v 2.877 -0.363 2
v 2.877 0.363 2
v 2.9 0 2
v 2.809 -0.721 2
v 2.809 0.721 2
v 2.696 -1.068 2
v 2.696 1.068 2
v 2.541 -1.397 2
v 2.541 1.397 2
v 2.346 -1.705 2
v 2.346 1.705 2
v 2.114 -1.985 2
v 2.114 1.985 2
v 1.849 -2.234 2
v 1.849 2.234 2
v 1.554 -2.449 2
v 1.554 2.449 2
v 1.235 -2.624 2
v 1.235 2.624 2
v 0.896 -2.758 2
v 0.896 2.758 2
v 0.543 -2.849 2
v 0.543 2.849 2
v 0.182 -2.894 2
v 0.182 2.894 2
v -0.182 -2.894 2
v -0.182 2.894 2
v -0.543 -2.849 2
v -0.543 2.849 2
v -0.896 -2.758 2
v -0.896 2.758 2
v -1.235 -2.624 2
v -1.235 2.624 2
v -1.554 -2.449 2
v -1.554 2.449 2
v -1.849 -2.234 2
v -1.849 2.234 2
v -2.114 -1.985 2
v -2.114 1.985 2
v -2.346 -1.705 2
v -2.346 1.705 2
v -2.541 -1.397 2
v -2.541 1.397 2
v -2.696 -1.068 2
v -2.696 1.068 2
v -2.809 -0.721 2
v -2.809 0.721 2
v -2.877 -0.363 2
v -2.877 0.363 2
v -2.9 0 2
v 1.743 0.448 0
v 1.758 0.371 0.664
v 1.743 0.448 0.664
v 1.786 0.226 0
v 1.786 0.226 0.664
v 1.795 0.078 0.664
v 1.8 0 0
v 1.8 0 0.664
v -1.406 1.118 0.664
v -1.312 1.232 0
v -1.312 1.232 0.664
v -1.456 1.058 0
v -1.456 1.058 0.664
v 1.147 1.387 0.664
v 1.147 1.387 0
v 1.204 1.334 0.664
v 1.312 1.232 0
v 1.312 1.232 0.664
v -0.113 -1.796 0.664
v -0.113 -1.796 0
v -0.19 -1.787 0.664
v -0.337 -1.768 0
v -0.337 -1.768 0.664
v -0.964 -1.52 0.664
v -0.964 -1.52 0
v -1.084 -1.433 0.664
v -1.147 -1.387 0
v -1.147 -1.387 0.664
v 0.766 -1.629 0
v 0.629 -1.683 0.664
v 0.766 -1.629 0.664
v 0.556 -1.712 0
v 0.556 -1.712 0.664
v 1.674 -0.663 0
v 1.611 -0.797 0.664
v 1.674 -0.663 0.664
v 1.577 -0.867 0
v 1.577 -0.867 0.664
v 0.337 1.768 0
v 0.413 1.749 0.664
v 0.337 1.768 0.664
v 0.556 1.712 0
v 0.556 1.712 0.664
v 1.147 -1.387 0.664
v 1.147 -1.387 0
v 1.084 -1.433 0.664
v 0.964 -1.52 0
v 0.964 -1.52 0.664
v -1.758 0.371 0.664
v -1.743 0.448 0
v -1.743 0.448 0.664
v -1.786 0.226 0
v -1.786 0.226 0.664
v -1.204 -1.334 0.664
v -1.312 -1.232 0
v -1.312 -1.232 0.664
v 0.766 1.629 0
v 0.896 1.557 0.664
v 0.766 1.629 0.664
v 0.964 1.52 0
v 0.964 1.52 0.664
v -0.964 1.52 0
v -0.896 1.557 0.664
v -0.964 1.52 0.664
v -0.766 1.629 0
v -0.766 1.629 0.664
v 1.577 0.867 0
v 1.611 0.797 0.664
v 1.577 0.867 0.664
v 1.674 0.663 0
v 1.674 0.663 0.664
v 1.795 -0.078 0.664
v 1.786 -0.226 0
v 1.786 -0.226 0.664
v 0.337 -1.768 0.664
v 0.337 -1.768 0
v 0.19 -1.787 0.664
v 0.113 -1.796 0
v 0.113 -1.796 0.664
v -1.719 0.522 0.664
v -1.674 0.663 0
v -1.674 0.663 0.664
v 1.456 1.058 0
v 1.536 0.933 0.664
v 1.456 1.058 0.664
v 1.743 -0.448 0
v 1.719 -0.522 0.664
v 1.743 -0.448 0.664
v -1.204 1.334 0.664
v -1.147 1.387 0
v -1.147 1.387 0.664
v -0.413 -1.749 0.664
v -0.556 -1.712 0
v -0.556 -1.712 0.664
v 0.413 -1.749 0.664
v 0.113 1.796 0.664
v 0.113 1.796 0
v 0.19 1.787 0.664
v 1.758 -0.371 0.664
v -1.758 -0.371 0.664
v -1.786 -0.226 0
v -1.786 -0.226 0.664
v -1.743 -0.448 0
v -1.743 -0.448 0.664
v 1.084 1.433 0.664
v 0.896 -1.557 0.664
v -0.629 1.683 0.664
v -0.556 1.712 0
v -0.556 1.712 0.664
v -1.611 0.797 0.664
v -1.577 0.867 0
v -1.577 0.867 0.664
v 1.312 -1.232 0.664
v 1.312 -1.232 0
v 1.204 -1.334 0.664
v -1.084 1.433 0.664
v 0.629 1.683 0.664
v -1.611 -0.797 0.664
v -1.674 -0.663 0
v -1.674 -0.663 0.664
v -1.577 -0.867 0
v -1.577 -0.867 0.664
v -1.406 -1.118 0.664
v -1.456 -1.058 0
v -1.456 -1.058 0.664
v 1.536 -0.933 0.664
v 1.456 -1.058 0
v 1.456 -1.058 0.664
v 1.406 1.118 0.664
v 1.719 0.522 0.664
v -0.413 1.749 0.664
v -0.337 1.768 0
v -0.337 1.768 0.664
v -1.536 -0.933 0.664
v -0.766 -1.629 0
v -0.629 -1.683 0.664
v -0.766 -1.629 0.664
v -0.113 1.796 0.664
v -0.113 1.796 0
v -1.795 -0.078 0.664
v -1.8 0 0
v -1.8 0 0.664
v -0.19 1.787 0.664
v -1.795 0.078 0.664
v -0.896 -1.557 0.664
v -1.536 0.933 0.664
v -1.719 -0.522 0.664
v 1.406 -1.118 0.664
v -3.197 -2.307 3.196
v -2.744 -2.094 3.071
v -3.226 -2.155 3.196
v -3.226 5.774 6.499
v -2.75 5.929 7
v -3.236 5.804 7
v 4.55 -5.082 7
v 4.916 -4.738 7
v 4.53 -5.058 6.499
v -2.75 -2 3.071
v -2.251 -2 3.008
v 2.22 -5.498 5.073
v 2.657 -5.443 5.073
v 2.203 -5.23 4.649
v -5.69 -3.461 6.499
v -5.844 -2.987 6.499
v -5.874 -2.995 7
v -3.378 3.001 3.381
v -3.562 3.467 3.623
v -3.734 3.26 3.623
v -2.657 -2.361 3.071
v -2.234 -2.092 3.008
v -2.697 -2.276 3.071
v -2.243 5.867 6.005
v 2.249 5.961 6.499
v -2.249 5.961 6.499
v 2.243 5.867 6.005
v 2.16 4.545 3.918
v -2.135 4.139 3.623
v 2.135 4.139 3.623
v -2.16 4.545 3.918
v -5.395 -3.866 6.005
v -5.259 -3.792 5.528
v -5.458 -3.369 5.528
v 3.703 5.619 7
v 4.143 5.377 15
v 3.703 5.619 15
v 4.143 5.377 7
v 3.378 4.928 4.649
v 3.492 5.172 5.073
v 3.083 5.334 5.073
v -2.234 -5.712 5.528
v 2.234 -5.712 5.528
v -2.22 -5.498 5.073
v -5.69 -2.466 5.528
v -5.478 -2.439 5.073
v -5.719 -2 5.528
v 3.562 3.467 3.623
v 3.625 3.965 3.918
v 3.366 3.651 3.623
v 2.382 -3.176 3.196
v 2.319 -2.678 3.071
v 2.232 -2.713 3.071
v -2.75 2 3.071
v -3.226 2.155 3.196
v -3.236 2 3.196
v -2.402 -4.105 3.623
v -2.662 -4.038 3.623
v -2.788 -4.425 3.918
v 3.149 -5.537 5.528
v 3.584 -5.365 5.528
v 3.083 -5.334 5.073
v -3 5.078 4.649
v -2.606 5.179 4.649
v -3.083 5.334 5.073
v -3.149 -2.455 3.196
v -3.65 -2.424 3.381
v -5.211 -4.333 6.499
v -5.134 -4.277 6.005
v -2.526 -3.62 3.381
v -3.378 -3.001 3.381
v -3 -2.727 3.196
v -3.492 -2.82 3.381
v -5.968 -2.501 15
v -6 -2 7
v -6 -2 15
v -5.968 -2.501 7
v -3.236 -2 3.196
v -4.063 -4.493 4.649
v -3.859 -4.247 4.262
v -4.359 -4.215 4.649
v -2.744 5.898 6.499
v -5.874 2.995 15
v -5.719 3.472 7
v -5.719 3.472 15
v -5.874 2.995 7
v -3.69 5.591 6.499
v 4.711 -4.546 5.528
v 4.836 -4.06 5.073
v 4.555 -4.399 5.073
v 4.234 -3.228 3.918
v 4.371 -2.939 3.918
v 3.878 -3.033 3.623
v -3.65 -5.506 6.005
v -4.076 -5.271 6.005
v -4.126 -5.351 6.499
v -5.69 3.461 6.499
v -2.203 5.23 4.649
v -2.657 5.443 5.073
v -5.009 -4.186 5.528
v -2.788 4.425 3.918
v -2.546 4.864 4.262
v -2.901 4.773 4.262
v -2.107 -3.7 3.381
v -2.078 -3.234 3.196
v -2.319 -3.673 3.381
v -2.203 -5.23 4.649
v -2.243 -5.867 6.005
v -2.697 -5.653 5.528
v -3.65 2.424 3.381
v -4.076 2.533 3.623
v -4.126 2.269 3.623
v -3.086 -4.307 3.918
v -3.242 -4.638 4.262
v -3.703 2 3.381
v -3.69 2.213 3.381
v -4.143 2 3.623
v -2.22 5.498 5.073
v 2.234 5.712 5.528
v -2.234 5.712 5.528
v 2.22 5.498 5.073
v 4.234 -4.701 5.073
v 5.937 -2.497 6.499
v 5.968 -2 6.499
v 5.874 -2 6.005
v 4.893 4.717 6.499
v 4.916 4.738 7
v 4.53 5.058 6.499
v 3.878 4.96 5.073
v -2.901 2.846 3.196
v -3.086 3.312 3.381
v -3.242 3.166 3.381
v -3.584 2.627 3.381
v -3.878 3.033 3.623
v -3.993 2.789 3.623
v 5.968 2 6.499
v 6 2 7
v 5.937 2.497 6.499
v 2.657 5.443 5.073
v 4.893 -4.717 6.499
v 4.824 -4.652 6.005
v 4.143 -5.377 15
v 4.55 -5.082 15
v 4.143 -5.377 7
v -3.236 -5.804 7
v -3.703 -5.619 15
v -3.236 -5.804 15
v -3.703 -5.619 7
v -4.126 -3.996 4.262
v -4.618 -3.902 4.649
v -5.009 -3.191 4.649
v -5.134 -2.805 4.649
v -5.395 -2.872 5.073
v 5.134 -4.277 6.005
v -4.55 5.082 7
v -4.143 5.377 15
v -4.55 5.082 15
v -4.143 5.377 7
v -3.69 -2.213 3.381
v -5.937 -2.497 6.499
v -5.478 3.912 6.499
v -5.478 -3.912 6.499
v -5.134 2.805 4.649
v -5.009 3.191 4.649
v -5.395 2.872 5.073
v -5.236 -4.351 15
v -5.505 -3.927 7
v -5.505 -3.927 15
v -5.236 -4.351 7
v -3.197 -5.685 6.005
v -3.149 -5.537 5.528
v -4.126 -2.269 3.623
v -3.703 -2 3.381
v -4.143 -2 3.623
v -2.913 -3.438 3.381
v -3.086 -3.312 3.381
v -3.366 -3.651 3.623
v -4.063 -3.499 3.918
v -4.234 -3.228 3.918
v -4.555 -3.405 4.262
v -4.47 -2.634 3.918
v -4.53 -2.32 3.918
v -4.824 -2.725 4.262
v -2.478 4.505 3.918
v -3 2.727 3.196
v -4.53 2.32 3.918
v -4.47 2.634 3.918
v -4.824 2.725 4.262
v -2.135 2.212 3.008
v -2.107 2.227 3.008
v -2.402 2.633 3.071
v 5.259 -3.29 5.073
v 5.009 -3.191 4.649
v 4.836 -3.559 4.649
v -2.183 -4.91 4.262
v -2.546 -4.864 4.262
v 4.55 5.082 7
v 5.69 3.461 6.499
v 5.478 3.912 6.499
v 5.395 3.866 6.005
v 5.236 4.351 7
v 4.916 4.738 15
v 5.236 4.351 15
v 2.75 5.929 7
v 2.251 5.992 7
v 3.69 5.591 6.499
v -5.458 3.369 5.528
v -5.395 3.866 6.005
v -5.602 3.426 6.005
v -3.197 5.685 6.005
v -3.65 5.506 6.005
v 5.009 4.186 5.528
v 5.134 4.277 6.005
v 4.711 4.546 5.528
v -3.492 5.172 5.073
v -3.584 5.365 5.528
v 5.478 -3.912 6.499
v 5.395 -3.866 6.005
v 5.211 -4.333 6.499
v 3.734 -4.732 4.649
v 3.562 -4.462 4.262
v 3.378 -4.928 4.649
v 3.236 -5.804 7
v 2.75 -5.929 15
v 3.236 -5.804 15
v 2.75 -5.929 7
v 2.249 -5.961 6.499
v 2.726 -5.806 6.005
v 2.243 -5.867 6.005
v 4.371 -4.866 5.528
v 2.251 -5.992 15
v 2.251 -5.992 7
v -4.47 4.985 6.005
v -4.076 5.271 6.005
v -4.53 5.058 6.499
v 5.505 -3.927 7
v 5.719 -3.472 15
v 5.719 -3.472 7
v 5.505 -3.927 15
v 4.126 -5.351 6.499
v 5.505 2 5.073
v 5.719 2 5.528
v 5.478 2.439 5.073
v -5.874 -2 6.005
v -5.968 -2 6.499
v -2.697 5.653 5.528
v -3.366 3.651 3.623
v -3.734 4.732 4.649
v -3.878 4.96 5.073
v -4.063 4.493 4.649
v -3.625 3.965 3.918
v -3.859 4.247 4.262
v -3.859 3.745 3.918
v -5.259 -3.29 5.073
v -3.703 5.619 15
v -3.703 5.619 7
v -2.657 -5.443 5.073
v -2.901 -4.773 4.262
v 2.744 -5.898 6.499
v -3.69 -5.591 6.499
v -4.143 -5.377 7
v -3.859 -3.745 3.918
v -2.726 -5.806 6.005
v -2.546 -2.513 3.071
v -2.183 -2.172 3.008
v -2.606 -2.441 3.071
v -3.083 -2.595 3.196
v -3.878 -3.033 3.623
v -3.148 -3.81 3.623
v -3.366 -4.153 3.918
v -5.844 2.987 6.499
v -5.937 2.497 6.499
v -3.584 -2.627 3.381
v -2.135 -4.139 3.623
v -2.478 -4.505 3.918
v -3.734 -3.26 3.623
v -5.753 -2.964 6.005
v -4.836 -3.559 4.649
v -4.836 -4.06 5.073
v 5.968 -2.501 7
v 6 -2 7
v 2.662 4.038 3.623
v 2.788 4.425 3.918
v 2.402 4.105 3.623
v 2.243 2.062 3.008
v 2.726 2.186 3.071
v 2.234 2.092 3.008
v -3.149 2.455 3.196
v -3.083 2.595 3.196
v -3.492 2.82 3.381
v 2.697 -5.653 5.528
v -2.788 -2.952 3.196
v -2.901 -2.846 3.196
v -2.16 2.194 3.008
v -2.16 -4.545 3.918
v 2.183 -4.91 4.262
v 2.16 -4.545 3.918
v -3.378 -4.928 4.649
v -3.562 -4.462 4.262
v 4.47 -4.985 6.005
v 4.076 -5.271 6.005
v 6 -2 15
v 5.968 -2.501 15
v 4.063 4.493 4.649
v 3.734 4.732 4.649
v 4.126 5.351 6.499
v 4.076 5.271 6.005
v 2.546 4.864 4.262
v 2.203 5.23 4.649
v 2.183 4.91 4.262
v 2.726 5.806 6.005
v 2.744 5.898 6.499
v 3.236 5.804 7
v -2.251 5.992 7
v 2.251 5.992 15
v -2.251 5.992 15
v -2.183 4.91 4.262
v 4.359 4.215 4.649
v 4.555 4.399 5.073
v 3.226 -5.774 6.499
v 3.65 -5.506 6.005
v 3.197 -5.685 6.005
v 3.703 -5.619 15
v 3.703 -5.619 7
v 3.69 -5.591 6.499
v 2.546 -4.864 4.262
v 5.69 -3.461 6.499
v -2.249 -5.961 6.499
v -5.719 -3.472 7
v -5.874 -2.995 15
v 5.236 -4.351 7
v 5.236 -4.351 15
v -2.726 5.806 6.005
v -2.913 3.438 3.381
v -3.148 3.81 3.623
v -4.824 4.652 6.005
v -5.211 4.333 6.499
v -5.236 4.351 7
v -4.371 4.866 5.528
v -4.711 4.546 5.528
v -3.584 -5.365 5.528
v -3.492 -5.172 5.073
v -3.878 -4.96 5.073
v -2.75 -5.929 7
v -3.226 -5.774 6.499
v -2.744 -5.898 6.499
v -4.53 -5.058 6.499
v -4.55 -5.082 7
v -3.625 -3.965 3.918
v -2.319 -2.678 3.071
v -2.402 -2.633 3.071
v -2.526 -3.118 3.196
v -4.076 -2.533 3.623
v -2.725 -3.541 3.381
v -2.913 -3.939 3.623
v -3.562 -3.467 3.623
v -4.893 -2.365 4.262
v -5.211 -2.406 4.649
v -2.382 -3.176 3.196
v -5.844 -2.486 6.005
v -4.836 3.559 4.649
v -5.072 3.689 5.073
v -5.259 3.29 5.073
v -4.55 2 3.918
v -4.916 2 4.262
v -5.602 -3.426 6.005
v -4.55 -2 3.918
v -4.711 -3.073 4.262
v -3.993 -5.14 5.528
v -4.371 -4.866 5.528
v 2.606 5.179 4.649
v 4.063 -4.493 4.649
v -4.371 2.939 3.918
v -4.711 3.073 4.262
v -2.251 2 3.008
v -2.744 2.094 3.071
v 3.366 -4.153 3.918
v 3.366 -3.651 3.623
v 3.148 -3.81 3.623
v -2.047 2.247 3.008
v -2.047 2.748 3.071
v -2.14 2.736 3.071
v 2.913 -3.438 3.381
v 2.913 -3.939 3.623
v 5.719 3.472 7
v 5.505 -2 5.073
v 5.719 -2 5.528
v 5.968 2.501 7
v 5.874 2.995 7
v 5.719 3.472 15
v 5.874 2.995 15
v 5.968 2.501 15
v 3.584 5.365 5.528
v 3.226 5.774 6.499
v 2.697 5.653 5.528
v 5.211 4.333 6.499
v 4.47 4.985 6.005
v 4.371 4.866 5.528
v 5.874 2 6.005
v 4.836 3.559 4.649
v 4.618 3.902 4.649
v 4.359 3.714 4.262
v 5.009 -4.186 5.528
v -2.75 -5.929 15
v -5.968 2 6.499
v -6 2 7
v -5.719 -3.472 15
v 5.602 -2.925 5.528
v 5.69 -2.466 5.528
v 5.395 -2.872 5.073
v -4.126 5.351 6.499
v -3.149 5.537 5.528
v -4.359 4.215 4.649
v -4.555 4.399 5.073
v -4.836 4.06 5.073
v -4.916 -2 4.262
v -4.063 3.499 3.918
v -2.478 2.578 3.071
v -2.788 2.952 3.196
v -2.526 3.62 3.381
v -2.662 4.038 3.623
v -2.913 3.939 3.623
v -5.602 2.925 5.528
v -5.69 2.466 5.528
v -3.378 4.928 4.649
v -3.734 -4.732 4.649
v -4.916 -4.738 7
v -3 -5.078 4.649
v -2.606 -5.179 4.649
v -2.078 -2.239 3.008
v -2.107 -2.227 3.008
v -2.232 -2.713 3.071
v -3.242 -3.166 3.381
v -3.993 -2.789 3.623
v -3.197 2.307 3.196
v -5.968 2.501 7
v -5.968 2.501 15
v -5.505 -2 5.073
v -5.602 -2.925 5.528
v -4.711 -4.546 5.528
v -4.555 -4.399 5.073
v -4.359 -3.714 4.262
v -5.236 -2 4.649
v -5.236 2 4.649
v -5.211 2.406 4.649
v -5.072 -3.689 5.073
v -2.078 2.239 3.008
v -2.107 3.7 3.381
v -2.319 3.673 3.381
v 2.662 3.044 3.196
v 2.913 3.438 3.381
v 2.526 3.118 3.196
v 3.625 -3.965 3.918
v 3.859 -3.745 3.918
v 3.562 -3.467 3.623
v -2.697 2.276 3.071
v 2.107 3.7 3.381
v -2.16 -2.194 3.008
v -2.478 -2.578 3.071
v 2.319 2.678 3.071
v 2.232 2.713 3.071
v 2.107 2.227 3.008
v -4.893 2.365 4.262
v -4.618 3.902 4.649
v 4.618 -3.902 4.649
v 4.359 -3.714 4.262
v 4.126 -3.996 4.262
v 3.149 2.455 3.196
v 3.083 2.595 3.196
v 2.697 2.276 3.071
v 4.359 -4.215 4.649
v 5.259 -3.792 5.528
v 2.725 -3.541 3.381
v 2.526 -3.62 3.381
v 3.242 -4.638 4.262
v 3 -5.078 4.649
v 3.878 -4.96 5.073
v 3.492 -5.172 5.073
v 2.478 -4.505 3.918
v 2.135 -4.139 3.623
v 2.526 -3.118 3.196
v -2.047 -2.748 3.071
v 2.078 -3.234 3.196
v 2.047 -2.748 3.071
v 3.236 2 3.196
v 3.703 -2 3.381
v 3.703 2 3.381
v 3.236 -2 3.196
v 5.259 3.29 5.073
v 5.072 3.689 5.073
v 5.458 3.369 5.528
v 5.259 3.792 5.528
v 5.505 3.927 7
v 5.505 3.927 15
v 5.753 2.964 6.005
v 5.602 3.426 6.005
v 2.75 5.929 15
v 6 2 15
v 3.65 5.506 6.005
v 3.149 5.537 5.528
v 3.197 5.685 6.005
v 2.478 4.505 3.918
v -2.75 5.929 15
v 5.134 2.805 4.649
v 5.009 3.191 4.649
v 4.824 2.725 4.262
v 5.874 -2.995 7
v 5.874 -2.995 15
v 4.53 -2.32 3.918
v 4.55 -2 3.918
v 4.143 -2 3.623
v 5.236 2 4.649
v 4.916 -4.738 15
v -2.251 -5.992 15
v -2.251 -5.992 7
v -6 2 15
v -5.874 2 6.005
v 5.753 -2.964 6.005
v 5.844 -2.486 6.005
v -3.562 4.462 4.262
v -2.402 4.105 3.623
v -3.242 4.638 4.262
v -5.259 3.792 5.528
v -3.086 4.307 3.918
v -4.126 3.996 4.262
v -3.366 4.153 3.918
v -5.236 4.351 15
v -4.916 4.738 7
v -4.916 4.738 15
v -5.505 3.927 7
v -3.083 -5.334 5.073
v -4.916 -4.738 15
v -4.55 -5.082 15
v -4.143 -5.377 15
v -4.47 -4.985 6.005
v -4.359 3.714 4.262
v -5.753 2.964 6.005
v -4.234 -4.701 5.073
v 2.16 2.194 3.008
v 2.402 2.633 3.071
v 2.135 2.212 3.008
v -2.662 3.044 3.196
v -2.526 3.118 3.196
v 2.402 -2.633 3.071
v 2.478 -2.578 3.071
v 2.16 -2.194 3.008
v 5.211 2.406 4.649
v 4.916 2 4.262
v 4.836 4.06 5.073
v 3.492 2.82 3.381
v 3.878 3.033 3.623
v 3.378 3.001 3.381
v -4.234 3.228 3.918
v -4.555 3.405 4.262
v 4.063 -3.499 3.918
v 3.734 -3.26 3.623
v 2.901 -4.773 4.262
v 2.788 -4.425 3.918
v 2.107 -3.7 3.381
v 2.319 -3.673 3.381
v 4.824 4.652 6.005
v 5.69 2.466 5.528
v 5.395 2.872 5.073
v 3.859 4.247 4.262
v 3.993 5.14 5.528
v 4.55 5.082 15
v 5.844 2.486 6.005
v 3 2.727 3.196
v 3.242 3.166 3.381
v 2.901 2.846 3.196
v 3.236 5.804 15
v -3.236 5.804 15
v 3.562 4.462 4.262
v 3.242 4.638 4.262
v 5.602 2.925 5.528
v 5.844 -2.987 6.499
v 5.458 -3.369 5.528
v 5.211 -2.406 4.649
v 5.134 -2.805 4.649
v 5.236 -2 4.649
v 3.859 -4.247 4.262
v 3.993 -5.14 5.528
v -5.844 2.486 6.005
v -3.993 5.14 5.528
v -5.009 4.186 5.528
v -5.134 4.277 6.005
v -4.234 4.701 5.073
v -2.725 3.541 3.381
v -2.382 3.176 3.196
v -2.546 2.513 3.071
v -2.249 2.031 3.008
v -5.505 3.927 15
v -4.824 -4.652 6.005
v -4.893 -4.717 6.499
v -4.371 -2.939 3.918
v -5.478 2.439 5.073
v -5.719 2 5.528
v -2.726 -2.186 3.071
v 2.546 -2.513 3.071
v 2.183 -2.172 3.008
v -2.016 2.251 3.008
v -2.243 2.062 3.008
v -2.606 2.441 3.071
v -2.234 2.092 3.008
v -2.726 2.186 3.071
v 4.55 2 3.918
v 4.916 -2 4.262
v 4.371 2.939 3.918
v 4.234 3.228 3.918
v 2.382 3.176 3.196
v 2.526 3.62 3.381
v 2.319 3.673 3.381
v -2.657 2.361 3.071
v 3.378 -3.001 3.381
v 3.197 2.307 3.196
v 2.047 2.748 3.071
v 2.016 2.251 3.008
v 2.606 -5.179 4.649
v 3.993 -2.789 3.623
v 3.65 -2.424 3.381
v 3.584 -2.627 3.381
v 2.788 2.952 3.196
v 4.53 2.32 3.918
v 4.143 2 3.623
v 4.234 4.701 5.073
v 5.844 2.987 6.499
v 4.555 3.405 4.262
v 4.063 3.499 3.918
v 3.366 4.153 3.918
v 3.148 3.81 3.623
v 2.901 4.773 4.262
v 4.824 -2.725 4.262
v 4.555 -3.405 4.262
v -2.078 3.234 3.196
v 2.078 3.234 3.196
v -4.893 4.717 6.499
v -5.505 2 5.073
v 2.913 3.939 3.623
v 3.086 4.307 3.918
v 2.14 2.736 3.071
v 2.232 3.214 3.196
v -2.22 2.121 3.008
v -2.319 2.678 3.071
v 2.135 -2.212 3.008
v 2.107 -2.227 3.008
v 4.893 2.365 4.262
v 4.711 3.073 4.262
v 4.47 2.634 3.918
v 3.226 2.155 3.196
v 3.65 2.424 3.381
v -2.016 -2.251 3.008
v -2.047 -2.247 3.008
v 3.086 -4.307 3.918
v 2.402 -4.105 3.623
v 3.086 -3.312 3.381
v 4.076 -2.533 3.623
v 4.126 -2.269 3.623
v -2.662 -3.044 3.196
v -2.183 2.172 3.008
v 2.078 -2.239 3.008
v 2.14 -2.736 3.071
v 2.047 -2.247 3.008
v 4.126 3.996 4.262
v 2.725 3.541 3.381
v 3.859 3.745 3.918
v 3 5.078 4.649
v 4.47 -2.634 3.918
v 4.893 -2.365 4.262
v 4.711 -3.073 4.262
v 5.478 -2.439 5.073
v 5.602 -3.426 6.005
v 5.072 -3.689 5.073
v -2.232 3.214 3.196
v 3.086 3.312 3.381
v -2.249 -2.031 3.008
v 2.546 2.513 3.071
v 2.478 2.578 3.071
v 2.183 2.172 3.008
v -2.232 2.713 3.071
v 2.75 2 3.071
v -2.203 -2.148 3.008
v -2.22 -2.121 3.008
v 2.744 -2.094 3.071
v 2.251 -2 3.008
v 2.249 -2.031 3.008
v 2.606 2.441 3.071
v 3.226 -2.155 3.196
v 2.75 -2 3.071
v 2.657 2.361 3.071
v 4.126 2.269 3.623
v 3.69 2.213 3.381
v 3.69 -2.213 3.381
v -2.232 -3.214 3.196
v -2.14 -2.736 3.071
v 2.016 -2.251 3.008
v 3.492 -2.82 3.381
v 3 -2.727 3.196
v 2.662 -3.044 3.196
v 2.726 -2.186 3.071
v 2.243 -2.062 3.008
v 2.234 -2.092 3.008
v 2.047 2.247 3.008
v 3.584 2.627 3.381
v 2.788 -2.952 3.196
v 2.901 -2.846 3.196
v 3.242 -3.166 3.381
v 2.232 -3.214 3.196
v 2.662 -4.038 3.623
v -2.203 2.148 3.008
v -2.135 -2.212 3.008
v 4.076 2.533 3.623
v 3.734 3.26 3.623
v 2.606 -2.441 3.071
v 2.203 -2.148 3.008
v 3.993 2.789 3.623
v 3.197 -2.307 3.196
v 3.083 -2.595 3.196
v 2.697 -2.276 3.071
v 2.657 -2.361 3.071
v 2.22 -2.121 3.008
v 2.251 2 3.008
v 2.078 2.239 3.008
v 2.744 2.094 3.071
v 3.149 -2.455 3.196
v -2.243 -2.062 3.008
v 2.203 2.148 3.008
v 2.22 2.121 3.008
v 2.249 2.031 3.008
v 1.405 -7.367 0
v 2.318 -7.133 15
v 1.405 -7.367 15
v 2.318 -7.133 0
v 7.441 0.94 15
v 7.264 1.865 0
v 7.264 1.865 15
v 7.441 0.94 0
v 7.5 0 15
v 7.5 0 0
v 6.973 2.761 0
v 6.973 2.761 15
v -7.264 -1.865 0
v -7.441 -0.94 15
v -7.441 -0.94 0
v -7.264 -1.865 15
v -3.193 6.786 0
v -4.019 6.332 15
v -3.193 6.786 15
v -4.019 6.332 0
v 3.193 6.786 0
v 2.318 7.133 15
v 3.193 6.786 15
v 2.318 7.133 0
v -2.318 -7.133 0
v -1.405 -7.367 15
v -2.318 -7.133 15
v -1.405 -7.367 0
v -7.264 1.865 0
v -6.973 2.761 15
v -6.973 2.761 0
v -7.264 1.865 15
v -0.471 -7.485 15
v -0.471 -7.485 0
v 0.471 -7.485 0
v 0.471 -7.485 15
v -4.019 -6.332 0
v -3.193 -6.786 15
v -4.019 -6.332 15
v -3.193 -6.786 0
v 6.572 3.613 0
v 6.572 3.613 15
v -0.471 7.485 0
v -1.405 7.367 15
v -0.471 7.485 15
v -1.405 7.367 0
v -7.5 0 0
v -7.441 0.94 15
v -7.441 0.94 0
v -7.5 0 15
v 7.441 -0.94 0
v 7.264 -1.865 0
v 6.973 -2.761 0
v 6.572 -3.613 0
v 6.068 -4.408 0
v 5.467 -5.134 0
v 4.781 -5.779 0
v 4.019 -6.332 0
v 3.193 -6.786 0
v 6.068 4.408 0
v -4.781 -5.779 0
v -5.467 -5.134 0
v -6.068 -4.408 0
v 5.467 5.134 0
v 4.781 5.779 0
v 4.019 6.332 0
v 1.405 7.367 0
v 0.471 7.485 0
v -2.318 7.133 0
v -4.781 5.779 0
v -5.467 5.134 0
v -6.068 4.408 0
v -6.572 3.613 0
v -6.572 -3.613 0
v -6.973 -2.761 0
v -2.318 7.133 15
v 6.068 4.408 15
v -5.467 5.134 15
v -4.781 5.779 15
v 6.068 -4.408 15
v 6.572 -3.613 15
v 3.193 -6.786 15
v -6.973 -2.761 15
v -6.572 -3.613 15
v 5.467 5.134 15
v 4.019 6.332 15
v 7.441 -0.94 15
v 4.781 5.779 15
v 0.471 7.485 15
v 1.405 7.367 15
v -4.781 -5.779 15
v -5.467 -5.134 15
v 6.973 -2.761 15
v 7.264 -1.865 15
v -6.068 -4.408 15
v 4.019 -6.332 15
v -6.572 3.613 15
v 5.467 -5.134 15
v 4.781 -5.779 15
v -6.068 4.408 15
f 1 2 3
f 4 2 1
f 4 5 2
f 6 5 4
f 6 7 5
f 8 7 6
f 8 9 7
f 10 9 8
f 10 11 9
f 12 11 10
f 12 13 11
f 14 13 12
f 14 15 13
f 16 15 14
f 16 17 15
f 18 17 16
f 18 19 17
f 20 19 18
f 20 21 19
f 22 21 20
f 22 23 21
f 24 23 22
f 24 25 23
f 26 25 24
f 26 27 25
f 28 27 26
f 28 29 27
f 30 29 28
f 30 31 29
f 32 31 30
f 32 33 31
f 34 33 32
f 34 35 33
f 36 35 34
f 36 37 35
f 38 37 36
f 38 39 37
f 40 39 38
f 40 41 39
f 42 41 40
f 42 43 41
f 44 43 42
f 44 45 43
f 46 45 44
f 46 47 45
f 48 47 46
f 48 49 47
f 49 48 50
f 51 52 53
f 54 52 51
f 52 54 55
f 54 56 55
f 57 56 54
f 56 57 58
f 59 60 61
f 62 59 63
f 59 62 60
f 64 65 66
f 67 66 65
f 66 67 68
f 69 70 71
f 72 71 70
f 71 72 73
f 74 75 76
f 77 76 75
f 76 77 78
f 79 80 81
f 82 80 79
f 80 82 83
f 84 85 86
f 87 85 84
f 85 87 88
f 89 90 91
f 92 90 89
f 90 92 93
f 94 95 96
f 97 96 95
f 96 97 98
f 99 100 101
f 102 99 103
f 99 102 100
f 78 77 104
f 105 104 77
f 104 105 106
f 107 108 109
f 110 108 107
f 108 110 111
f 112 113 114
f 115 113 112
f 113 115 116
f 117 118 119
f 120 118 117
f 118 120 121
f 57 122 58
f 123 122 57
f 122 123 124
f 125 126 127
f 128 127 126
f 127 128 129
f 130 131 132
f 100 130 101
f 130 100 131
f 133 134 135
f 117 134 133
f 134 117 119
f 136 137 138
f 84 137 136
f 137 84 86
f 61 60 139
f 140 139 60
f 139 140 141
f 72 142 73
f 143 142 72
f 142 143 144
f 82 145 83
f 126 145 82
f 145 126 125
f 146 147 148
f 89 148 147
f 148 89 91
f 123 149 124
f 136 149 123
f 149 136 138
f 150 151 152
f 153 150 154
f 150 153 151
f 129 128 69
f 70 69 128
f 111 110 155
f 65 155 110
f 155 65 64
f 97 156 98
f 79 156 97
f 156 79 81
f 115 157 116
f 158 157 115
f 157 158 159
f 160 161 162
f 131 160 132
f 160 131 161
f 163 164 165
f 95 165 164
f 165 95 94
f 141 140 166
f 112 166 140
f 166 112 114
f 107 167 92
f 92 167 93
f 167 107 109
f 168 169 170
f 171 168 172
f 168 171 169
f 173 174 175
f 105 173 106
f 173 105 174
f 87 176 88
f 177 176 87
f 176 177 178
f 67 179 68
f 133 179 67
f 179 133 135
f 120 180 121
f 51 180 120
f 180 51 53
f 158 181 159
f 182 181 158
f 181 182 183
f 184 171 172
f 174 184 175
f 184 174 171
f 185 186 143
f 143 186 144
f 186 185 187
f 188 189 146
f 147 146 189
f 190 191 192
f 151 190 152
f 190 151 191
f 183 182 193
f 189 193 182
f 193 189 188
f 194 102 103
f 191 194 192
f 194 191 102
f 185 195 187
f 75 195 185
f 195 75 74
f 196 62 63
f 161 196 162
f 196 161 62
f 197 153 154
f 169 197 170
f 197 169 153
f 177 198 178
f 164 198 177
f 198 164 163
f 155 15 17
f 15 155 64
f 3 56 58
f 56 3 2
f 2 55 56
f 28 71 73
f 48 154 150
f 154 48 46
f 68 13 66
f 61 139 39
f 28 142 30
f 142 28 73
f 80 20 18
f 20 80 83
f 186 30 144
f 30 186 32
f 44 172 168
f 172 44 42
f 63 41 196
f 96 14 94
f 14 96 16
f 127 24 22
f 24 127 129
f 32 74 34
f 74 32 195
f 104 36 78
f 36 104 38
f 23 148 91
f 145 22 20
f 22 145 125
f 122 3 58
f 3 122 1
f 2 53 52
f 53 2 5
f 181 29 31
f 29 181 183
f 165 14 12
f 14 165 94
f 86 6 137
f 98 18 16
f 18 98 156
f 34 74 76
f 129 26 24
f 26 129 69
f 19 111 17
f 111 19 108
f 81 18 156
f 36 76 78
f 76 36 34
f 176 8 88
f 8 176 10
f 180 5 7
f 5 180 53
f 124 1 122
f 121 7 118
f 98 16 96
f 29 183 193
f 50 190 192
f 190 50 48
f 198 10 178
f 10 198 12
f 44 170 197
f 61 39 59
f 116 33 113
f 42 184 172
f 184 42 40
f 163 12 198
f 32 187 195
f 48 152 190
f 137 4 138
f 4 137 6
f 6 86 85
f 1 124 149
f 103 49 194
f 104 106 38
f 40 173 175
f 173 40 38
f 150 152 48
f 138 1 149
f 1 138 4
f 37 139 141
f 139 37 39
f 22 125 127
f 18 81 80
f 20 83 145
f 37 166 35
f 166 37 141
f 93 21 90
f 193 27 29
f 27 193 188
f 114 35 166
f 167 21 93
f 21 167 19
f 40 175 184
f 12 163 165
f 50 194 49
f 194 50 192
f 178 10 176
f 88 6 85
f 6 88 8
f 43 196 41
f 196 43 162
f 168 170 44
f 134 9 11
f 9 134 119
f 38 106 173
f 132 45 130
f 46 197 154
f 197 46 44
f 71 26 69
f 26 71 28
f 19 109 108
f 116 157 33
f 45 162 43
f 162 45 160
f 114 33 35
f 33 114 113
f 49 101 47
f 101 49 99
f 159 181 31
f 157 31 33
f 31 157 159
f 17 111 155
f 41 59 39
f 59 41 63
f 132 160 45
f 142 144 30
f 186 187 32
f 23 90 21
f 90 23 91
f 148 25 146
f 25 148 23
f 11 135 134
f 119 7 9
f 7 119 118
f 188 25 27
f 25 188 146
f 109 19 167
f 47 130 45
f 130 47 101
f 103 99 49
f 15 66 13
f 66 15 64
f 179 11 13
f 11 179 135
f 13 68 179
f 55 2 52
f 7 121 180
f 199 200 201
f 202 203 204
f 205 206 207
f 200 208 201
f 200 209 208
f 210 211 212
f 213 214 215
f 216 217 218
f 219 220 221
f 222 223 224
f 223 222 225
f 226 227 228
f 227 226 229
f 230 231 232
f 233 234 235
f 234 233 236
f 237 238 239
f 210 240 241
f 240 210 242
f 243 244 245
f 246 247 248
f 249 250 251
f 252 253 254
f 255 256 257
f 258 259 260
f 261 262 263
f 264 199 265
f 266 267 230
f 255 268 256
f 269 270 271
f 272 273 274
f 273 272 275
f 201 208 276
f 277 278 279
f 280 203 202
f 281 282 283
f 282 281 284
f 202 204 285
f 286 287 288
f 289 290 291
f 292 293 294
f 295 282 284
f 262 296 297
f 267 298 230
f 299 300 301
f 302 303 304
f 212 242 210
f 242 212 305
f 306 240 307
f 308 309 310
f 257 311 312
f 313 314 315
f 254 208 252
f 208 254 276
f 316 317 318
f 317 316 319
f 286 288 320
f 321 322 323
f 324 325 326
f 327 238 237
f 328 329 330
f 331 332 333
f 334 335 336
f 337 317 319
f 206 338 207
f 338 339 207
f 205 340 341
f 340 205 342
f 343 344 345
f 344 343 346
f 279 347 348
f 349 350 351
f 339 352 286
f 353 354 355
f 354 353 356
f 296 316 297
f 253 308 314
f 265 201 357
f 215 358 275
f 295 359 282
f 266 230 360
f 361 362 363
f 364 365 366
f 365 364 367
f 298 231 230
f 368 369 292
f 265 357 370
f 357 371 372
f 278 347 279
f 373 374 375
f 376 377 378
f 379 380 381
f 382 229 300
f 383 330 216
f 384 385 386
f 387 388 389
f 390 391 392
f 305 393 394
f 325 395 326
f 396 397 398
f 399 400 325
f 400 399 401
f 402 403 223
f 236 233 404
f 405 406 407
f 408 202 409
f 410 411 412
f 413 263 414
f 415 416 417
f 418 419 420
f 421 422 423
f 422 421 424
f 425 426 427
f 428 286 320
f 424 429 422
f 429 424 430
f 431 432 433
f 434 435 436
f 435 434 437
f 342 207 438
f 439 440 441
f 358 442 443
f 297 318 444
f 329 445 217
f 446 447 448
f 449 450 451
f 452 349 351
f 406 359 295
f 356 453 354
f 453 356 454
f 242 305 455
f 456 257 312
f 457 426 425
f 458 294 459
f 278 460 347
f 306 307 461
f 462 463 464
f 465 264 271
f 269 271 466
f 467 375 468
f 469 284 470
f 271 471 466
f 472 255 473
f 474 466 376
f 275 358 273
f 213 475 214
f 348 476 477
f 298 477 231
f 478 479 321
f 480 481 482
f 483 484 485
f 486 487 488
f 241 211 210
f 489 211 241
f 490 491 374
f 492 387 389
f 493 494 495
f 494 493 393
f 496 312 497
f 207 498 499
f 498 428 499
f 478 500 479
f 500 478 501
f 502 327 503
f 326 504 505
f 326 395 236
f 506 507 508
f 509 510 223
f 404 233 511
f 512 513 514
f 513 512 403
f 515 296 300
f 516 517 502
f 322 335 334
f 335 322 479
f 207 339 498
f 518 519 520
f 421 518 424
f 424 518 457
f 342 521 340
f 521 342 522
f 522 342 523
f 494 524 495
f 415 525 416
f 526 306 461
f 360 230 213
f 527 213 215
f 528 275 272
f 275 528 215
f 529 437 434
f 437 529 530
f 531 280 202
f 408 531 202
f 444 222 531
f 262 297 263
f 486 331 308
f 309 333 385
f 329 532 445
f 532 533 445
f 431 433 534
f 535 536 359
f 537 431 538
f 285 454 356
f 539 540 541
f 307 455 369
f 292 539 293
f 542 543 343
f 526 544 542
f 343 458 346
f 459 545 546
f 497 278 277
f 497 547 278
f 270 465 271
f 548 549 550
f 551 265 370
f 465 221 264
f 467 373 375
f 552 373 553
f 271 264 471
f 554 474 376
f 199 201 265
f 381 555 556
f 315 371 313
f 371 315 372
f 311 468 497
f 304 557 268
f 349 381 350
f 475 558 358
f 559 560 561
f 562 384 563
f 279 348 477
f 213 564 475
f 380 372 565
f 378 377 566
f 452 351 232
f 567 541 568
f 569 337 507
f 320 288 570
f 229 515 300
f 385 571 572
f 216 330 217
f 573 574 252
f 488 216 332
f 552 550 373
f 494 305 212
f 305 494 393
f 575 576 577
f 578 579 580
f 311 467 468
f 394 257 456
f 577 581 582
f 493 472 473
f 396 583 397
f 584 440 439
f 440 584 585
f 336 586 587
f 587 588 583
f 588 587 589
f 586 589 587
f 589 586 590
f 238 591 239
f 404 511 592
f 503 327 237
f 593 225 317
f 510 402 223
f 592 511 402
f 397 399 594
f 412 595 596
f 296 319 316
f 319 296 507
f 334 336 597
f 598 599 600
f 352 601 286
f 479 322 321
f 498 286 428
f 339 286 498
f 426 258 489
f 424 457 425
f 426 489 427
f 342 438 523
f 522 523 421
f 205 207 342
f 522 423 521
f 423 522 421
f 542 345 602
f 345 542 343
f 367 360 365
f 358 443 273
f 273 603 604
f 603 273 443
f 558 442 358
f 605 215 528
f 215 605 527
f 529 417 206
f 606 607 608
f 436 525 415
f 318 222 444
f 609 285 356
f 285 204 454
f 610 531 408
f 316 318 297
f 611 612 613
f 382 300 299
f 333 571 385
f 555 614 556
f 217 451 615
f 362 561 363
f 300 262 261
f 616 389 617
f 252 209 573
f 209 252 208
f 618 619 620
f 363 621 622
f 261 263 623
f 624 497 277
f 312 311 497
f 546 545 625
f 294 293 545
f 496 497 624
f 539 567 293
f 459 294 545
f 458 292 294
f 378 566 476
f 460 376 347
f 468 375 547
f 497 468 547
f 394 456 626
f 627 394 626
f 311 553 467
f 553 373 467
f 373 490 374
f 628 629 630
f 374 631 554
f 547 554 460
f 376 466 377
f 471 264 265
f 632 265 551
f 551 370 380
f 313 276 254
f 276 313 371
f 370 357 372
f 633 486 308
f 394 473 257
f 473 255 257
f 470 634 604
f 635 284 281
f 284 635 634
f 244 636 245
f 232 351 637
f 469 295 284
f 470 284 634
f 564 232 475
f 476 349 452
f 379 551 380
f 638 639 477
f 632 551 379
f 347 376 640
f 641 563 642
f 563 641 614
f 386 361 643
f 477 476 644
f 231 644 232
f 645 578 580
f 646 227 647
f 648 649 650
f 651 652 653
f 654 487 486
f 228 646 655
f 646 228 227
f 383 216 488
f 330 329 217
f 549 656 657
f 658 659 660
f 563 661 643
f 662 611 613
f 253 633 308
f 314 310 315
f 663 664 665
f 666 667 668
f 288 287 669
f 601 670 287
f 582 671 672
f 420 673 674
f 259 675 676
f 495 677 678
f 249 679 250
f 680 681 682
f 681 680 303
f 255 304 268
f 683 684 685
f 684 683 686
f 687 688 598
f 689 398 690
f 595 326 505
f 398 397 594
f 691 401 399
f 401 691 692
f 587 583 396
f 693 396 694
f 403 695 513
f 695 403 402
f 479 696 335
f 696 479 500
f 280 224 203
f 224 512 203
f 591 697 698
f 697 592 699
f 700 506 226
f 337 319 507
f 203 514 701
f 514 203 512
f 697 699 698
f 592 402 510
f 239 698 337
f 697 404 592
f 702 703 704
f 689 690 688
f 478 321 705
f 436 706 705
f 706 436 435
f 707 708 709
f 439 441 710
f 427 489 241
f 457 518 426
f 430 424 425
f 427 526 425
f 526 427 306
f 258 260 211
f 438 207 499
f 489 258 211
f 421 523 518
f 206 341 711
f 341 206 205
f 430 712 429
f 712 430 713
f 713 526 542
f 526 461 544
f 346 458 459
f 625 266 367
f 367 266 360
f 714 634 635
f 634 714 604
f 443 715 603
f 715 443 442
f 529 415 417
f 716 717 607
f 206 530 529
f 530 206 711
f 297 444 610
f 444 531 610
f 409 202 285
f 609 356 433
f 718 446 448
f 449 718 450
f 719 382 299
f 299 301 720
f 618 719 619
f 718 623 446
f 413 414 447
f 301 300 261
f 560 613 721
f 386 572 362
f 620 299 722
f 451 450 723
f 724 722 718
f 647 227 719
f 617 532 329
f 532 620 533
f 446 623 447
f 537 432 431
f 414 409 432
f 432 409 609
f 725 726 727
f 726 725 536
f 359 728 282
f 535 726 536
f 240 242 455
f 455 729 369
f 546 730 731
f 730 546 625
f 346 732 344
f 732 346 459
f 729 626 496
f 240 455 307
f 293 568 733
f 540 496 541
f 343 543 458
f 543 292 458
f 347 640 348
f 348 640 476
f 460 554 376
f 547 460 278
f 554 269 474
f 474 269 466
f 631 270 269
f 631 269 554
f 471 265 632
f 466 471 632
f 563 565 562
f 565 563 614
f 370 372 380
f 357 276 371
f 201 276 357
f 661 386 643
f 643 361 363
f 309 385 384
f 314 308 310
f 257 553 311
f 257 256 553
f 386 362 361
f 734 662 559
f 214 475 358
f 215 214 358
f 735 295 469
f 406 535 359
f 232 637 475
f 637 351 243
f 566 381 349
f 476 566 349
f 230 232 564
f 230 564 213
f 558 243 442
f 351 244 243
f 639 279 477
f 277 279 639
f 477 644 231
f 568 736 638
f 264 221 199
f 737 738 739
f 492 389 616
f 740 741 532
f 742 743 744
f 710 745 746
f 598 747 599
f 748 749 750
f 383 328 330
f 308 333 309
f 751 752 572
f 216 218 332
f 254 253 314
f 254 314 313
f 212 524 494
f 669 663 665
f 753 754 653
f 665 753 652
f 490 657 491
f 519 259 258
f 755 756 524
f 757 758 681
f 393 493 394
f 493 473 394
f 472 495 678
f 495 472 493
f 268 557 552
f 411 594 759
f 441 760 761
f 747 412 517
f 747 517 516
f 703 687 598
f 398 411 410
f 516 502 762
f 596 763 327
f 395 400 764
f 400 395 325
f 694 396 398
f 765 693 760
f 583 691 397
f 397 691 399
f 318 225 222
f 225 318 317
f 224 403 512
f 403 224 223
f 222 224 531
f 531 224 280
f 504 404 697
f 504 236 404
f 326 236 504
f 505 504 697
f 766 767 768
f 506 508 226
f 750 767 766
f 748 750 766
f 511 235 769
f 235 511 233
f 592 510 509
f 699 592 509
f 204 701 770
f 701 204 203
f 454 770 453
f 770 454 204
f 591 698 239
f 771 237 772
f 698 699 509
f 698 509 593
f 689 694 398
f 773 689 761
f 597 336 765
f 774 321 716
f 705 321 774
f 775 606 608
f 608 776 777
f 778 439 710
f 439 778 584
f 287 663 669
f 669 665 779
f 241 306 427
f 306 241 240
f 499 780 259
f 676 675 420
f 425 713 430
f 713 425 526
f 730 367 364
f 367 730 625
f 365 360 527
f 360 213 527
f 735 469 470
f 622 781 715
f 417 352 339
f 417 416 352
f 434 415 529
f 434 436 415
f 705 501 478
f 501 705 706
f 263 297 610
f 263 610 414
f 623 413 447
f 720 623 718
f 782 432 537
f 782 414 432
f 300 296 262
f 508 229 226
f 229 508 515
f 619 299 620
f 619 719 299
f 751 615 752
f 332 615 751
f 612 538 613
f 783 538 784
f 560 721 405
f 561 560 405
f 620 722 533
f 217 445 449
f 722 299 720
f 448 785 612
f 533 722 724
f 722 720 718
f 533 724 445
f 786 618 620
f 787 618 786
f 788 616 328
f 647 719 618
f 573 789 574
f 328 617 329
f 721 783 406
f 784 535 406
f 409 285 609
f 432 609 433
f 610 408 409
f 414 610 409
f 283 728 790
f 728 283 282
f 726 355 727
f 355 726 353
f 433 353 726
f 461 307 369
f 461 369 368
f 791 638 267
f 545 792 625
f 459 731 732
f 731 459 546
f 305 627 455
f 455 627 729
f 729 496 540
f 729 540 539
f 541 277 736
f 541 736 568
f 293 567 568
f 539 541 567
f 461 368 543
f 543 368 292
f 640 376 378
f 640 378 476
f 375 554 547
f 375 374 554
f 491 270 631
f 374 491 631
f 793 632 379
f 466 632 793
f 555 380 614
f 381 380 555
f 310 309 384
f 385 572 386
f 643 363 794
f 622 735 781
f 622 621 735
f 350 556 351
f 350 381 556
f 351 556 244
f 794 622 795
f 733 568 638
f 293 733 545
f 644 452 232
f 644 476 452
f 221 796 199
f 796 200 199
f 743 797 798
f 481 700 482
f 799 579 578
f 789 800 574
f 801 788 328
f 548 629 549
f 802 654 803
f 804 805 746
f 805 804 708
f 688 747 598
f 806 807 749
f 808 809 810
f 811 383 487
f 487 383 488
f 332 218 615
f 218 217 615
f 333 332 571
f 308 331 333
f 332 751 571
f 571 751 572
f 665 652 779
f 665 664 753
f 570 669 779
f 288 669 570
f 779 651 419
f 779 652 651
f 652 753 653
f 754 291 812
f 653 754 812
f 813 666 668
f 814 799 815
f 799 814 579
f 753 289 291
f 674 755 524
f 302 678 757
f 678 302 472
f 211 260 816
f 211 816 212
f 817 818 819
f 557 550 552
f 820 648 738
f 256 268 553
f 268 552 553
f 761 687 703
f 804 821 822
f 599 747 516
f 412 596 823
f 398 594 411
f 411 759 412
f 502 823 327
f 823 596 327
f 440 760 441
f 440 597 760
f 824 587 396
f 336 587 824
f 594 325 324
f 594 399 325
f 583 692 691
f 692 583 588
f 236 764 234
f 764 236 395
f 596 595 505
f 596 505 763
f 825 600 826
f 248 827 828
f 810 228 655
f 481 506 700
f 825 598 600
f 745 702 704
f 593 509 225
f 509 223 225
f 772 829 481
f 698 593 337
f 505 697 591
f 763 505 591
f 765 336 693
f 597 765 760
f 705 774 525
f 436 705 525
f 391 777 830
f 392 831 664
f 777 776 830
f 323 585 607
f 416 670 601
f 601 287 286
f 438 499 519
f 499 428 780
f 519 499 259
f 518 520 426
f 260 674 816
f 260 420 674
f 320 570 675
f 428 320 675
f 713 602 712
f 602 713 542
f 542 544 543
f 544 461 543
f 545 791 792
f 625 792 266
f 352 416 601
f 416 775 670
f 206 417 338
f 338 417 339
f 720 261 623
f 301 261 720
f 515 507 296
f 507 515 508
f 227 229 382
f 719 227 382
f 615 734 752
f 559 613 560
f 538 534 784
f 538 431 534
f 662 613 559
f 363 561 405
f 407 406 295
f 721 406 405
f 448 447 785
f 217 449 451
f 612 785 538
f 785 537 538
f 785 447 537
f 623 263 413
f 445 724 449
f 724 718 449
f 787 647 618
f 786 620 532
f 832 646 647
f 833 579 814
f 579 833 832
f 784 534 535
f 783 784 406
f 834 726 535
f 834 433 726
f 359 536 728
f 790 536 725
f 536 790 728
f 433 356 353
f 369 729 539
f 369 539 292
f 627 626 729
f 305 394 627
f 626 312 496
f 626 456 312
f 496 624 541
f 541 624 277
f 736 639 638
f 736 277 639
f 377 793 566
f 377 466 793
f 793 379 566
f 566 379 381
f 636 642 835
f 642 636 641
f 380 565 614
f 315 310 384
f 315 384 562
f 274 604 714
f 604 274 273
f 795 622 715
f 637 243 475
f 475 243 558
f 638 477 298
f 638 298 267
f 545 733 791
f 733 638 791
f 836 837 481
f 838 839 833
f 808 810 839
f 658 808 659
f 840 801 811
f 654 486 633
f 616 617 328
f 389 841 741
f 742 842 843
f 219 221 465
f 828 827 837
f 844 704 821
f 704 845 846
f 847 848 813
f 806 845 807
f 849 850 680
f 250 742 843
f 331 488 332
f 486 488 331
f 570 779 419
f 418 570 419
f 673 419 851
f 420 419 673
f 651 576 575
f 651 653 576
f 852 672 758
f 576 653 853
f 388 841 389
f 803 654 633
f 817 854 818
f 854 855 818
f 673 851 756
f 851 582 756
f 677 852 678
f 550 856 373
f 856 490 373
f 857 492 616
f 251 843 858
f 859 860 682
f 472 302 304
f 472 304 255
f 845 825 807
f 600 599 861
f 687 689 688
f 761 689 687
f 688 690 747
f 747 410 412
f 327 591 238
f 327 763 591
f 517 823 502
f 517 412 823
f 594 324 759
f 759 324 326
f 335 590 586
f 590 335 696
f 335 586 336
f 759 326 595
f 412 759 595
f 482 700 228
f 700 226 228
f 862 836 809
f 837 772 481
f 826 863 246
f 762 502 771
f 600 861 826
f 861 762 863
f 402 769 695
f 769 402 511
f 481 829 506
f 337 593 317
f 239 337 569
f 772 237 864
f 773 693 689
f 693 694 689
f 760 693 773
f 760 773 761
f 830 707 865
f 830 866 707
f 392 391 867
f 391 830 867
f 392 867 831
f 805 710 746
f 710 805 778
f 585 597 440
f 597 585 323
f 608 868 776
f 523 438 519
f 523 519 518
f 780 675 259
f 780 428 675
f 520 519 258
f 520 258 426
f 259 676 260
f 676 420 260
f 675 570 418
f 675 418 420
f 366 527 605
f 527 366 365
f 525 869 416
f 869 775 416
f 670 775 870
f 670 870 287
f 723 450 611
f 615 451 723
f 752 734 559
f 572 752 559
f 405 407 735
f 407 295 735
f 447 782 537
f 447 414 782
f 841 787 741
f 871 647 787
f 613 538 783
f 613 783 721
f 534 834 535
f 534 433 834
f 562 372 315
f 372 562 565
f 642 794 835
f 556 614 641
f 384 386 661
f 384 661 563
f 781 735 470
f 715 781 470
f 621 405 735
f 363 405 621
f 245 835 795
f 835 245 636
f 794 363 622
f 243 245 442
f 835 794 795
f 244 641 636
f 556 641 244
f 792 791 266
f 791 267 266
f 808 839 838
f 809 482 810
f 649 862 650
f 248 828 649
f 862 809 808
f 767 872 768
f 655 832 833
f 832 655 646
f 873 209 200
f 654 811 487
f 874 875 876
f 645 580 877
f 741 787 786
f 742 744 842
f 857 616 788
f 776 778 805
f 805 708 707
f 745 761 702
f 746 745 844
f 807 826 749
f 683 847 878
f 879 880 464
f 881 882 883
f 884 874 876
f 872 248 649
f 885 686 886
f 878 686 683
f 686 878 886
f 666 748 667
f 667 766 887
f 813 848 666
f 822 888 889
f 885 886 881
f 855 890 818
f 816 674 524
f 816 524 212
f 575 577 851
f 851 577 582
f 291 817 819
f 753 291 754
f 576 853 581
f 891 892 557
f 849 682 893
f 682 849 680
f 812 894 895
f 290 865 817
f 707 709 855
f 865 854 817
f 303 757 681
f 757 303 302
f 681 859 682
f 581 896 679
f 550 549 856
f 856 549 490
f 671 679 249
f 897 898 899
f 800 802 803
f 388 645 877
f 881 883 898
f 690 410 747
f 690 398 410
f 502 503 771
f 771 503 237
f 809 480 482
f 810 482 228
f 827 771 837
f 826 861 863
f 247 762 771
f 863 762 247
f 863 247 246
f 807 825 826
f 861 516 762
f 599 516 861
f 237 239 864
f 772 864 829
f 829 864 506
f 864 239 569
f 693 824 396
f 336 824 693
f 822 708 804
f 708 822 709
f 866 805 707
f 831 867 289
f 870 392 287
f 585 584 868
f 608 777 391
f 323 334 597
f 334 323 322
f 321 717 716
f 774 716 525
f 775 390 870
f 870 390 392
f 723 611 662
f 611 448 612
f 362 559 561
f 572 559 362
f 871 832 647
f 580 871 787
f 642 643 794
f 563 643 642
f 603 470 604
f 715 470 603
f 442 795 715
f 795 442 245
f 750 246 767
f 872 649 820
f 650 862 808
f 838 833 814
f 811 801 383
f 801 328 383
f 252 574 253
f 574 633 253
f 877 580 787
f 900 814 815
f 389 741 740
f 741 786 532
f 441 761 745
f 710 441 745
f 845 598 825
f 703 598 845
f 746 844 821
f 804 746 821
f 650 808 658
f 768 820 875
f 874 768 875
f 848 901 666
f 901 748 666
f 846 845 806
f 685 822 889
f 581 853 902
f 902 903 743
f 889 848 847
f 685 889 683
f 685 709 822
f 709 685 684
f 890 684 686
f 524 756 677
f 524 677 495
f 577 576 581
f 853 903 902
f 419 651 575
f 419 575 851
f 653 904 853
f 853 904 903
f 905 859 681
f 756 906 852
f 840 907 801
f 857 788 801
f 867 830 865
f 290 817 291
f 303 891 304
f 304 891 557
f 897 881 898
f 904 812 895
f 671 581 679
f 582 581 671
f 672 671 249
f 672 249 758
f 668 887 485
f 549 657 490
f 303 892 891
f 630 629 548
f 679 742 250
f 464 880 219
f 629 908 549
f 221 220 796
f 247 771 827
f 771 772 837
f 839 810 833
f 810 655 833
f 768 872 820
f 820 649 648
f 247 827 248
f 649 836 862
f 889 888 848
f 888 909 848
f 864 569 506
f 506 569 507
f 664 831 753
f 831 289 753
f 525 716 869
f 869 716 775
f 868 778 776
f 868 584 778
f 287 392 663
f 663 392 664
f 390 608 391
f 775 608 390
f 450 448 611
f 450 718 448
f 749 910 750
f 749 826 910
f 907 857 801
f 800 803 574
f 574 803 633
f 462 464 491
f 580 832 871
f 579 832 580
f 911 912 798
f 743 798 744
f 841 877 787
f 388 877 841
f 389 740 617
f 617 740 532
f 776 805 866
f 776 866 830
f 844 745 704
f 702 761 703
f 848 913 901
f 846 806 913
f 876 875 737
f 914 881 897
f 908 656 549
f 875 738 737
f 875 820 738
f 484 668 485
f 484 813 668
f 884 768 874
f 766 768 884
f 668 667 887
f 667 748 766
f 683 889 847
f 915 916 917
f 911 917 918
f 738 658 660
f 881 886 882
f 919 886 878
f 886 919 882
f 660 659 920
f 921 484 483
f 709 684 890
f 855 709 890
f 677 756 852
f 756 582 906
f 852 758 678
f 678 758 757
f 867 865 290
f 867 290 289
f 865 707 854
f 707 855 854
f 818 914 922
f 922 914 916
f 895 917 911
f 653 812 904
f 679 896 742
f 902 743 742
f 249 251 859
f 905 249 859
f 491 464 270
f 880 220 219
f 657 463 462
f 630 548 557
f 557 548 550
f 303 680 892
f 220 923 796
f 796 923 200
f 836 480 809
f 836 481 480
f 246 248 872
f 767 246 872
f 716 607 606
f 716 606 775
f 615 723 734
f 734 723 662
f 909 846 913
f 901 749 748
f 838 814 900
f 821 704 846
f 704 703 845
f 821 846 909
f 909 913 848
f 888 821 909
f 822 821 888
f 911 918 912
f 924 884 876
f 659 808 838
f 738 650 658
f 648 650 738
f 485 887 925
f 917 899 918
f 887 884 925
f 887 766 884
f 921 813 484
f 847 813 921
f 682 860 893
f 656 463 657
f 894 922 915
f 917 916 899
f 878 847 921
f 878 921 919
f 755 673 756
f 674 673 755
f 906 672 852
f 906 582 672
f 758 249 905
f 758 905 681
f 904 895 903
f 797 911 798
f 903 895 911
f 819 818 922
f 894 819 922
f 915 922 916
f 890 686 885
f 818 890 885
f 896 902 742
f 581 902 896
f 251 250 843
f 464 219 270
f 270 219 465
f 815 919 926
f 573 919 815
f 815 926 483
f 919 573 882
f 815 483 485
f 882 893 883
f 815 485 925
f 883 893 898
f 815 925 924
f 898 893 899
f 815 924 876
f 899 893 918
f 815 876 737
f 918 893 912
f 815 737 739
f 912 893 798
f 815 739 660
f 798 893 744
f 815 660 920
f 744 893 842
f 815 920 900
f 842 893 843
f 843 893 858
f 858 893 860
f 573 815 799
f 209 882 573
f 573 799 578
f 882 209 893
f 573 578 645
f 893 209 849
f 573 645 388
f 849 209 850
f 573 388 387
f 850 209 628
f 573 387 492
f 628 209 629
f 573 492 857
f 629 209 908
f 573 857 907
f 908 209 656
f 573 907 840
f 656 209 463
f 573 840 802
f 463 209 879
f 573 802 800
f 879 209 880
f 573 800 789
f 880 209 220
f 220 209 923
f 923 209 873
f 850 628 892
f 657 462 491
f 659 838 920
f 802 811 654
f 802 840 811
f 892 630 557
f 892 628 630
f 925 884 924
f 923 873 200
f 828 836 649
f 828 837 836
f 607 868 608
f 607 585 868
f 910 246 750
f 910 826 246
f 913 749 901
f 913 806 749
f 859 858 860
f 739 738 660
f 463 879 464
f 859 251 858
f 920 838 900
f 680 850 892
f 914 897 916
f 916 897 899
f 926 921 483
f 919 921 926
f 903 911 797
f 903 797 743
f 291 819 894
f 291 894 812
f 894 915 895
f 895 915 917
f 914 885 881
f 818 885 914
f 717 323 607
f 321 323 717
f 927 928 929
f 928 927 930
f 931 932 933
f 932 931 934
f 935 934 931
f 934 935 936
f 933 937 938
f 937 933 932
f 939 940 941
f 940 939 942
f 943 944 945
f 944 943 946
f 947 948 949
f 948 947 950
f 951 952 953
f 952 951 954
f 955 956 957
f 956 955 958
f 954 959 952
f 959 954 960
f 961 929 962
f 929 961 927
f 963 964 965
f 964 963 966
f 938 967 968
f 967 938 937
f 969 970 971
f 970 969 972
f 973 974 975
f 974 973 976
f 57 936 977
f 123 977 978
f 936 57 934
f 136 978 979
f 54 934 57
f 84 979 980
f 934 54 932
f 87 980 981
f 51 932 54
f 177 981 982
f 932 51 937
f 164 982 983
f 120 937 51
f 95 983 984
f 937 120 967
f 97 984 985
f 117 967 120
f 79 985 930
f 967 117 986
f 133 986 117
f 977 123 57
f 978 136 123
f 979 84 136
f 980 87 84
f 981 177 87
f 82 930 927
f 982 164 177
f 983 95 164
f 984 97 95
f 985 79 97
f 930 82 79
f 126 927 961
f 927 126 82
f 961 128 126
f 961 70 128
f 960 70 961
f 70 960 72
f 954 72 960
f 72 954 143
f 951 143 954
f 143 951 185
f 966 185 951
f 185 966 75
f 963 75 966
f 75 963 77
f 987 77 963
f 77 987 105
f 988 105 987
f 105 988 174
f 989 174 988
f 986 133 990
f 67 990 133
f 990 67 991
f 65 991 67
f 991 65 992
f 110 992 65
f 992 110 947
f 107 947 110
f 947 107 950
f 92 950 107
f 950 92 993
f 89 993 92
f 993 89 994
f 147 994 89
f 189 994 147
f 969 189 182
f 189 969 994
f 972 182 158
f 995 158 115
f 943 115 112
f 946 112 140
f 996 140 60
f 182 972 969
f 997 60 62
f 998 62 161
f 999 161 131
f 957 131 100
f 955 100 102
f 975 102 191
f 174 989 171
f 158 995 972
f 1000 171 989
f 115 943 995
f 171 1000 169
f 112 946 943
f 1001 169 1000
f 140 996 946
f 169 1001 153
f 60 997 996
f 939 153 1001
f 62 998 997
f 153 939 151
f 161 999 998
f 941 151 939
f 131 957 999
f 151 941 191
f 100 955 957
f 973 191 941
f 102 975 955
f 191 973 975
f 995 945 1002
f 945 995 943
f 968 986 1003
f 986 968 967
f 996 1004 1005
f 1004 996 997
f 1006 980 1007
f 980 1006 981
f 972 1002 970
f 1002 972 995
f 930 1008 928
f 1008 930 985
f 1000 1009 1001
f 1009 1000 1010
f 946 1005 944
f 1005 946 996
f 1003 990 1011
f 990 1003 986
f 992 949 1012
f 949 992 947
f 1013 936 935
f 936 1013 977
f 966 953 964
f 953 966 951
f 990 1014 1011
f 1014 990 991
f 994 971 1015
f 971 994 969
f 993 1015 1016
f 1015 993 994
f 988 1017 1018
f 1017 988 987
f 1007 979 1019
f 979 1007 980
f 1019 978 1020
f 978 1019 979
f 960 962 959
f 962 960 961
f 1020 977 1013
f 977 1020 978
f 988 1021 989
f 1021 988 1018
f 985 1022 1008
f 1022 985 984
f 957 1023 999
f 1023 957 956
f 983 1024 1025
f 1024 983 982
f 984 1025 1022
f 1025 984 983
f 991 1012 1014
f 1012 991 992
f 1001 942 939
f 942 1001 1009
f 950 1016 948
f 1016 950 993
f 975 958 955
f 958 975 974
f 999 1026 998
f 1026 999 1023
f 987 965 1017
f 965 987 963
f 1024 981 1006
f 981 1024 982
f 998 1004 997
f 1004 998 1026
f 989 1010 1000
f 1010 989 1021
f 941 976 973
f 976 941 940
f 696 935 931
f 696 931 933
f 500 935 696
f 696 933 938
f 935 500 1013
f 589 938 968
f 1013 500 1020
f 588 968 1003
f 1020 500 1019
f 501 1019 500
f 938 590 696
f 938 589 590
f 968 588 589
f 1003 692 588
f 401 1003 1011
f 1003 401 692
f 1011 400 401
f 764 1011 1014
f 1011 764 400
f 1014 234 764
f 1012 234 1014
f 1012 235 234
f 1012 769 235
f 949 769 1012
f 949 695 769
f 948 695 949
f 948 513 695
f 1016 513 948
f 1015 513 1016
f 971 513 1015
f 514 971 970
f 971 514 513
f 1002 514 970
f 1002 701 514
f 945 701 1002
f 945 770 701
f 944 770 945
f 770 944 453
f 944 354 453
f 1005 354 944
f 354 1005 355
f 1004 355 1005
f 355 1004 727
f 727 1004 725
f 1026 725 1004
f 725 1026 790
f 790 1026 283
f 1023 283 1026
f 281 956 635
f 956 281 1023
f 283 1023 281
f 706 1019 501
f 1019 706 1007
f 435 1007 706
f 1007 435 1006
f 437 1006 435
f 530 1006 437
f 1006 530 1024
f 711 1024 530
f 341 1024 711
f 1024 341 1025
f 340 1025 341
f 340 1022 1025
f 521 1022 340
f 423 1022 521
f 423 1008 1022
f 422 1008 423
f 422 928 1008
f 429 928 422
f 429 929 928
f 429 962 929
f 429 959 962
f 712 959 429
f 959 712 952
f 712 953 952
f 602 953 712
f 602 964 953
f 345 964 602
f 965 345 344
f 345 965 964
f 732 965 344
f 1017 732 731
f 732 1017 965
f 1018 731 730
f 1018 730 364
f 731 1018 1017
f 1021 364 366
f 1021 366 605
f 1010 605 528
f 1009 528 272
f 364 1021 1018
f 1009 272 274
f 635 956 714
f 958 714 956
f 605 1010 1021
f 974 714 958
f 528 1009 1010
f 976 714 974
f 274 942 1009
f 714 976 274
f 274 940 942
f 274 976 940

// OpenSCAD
$fn = 50;


difference() {
	union() {
		cylinder(h = 15, r = 7.5000000000);
	}
	union() {
		translate(v = [0.0000000000, 0.0000000000, 2]) {
			rotate(a = [0, 0, 0]) {
				difference() {
					union() {
						translate(v = [0, 0, -6.0000000000]) {
							cylinder(h = 6, r = 1.5000000000);
						}
						translate(v = [0, 0, -6.0000000000]) {
							cylinder(h = 6, r = 1.8000000000);
						}
						translate(v = [0, 0, -1.7000000000]) {
							cylinder(h = 1.7000000000, r1 = 1.5000000000, r2 = 2.9000000000);
						}
						translate(v = [0, 0, -6.0000000000]) {
							cylinder(h = 6, r = 1.5000000000);
						}
					}
					union();
				}
			}
		}
		translate(v = [0.0000000000, 0.0000000000, 2]) {
			rotate(a = [0, 0, 0]) {
				difference() {
					union() {
						translate(v = [0, 0, -6.0000000000]) {
							cylinder(h = 6, r = 1.5000000000);
						}
						translate(v = [0, 0, -6.0000000000]) {
							cylinder(h = 6, r = 1.8000000000);
						}
						translate(v = [0, 0, -1.7000000000]) {
							cylinder(h = 1.7000000000, r1 = 1.5000000000, r2 = 2.9000000000);
						}
						translate(v = [0, 0, -6.0000000000]) {
							cylinder(h = 6, r = 1.5000000000);
						}
					}
					union();
				}
			}
		}
		translate(v = [0.0000000000, 0.0000000000, 2]) {
			rotate(a = [0, 0, 0]) {
				difference() {
					union() {
						translate(v = [0, 0, -6.0000000000]) {
							cylinder(h = 6, r = 1.5000000000);
						}
						translate(v = [0, 0, -6.0000000000]) {
							cylinder(h = 6, r = 1.8000000000);
						}
						translate(v = [0, 0, -1.7000000000]) {
							cylinder(h = 1.7000000000, r1 = 1.5000000000, r2 = 2.9000000000);
						}
						translate(v = [0, 0, -6.0000000000]) {
							cylinder(h = 6, r = 1.5000000000);
						}
					}
					union();
				}
			}
		}
		translate(v = [0.0000000000, 0.0000000000, 2]) {
			rotate(a = [0, 0, 0]) {
				difference() {
					union() {
						translate(v = [0, 0, -6.0000000000]) {
							cylinder(h = 6, r = 1.5000000000);
						}
						translate(v = [0, 0, -6.0000000000]) {
							cylinder(h = 6, r = 1.8000000000);
						}
						translate(v = [0, 0, -1.7000000000]) {
							cylinder(h = 1.7000000000, r1 = 1.5000000000, r2 = 2.9000000000);
						}
						translate(v = [0, 0, -6.0000000000]) {
							cylinder(h = 6, r = 1.5000000000);
						}
					}
					union();
				}
			}
		}
		translate(v = [0, 0, 3]) {
			hull() {
				union() {
					translate(v = [-2.0000000000, 2.0000000000, 4]) {
						cylinder(h = 27, r = 4);
					}
					translate(v = [-2.0000000000, 2.0000000000, 4]) {
						sphere(r = 4);
					}
					translate(v = [-2.0000000000, 2.0000000000, 31]) {
						sphere(r = 4);
					}
				}
				union() {
					translate(v = [2.0000000000, 2.0000000000, 4]) {
						cylinder(h = 27, r = 4);
					}
					translate(v = [2.0000000000, 2.0000000000, 4]) {
						sphere(r = 4);
					}
					translate(v = [2.0000000000, 2.0000000000, 31]) {
						sphere(r = 4);
					}
				}
				union() {
					translate(v = [-2.0000000000, -2.0000000000, 4]) {
						cylinder(h = 27, r = 4);
					}
					translate(v = [-2.0000000000, -2.0000000000, 4]) {
						sphere(r = 4);
					}
					translate(v = [-2.0000000000, -2.0000000000, 31]) {
						sphere(r = 4);
					}
				}
				union() {
					translate(v = [2.0000000000, -2.0000000000, 4]) {
						cylinder(h = 27, r = 4);
					}
					translate(v = [2.0000000000, -2.0000000000, 4]) {
						sphere(r = 4);
					}
					translate(v = [2.0000000000, -2.0000000000, 31]) {
						sphere(r = 4);
					}
				}
			}
		}
	}
}
